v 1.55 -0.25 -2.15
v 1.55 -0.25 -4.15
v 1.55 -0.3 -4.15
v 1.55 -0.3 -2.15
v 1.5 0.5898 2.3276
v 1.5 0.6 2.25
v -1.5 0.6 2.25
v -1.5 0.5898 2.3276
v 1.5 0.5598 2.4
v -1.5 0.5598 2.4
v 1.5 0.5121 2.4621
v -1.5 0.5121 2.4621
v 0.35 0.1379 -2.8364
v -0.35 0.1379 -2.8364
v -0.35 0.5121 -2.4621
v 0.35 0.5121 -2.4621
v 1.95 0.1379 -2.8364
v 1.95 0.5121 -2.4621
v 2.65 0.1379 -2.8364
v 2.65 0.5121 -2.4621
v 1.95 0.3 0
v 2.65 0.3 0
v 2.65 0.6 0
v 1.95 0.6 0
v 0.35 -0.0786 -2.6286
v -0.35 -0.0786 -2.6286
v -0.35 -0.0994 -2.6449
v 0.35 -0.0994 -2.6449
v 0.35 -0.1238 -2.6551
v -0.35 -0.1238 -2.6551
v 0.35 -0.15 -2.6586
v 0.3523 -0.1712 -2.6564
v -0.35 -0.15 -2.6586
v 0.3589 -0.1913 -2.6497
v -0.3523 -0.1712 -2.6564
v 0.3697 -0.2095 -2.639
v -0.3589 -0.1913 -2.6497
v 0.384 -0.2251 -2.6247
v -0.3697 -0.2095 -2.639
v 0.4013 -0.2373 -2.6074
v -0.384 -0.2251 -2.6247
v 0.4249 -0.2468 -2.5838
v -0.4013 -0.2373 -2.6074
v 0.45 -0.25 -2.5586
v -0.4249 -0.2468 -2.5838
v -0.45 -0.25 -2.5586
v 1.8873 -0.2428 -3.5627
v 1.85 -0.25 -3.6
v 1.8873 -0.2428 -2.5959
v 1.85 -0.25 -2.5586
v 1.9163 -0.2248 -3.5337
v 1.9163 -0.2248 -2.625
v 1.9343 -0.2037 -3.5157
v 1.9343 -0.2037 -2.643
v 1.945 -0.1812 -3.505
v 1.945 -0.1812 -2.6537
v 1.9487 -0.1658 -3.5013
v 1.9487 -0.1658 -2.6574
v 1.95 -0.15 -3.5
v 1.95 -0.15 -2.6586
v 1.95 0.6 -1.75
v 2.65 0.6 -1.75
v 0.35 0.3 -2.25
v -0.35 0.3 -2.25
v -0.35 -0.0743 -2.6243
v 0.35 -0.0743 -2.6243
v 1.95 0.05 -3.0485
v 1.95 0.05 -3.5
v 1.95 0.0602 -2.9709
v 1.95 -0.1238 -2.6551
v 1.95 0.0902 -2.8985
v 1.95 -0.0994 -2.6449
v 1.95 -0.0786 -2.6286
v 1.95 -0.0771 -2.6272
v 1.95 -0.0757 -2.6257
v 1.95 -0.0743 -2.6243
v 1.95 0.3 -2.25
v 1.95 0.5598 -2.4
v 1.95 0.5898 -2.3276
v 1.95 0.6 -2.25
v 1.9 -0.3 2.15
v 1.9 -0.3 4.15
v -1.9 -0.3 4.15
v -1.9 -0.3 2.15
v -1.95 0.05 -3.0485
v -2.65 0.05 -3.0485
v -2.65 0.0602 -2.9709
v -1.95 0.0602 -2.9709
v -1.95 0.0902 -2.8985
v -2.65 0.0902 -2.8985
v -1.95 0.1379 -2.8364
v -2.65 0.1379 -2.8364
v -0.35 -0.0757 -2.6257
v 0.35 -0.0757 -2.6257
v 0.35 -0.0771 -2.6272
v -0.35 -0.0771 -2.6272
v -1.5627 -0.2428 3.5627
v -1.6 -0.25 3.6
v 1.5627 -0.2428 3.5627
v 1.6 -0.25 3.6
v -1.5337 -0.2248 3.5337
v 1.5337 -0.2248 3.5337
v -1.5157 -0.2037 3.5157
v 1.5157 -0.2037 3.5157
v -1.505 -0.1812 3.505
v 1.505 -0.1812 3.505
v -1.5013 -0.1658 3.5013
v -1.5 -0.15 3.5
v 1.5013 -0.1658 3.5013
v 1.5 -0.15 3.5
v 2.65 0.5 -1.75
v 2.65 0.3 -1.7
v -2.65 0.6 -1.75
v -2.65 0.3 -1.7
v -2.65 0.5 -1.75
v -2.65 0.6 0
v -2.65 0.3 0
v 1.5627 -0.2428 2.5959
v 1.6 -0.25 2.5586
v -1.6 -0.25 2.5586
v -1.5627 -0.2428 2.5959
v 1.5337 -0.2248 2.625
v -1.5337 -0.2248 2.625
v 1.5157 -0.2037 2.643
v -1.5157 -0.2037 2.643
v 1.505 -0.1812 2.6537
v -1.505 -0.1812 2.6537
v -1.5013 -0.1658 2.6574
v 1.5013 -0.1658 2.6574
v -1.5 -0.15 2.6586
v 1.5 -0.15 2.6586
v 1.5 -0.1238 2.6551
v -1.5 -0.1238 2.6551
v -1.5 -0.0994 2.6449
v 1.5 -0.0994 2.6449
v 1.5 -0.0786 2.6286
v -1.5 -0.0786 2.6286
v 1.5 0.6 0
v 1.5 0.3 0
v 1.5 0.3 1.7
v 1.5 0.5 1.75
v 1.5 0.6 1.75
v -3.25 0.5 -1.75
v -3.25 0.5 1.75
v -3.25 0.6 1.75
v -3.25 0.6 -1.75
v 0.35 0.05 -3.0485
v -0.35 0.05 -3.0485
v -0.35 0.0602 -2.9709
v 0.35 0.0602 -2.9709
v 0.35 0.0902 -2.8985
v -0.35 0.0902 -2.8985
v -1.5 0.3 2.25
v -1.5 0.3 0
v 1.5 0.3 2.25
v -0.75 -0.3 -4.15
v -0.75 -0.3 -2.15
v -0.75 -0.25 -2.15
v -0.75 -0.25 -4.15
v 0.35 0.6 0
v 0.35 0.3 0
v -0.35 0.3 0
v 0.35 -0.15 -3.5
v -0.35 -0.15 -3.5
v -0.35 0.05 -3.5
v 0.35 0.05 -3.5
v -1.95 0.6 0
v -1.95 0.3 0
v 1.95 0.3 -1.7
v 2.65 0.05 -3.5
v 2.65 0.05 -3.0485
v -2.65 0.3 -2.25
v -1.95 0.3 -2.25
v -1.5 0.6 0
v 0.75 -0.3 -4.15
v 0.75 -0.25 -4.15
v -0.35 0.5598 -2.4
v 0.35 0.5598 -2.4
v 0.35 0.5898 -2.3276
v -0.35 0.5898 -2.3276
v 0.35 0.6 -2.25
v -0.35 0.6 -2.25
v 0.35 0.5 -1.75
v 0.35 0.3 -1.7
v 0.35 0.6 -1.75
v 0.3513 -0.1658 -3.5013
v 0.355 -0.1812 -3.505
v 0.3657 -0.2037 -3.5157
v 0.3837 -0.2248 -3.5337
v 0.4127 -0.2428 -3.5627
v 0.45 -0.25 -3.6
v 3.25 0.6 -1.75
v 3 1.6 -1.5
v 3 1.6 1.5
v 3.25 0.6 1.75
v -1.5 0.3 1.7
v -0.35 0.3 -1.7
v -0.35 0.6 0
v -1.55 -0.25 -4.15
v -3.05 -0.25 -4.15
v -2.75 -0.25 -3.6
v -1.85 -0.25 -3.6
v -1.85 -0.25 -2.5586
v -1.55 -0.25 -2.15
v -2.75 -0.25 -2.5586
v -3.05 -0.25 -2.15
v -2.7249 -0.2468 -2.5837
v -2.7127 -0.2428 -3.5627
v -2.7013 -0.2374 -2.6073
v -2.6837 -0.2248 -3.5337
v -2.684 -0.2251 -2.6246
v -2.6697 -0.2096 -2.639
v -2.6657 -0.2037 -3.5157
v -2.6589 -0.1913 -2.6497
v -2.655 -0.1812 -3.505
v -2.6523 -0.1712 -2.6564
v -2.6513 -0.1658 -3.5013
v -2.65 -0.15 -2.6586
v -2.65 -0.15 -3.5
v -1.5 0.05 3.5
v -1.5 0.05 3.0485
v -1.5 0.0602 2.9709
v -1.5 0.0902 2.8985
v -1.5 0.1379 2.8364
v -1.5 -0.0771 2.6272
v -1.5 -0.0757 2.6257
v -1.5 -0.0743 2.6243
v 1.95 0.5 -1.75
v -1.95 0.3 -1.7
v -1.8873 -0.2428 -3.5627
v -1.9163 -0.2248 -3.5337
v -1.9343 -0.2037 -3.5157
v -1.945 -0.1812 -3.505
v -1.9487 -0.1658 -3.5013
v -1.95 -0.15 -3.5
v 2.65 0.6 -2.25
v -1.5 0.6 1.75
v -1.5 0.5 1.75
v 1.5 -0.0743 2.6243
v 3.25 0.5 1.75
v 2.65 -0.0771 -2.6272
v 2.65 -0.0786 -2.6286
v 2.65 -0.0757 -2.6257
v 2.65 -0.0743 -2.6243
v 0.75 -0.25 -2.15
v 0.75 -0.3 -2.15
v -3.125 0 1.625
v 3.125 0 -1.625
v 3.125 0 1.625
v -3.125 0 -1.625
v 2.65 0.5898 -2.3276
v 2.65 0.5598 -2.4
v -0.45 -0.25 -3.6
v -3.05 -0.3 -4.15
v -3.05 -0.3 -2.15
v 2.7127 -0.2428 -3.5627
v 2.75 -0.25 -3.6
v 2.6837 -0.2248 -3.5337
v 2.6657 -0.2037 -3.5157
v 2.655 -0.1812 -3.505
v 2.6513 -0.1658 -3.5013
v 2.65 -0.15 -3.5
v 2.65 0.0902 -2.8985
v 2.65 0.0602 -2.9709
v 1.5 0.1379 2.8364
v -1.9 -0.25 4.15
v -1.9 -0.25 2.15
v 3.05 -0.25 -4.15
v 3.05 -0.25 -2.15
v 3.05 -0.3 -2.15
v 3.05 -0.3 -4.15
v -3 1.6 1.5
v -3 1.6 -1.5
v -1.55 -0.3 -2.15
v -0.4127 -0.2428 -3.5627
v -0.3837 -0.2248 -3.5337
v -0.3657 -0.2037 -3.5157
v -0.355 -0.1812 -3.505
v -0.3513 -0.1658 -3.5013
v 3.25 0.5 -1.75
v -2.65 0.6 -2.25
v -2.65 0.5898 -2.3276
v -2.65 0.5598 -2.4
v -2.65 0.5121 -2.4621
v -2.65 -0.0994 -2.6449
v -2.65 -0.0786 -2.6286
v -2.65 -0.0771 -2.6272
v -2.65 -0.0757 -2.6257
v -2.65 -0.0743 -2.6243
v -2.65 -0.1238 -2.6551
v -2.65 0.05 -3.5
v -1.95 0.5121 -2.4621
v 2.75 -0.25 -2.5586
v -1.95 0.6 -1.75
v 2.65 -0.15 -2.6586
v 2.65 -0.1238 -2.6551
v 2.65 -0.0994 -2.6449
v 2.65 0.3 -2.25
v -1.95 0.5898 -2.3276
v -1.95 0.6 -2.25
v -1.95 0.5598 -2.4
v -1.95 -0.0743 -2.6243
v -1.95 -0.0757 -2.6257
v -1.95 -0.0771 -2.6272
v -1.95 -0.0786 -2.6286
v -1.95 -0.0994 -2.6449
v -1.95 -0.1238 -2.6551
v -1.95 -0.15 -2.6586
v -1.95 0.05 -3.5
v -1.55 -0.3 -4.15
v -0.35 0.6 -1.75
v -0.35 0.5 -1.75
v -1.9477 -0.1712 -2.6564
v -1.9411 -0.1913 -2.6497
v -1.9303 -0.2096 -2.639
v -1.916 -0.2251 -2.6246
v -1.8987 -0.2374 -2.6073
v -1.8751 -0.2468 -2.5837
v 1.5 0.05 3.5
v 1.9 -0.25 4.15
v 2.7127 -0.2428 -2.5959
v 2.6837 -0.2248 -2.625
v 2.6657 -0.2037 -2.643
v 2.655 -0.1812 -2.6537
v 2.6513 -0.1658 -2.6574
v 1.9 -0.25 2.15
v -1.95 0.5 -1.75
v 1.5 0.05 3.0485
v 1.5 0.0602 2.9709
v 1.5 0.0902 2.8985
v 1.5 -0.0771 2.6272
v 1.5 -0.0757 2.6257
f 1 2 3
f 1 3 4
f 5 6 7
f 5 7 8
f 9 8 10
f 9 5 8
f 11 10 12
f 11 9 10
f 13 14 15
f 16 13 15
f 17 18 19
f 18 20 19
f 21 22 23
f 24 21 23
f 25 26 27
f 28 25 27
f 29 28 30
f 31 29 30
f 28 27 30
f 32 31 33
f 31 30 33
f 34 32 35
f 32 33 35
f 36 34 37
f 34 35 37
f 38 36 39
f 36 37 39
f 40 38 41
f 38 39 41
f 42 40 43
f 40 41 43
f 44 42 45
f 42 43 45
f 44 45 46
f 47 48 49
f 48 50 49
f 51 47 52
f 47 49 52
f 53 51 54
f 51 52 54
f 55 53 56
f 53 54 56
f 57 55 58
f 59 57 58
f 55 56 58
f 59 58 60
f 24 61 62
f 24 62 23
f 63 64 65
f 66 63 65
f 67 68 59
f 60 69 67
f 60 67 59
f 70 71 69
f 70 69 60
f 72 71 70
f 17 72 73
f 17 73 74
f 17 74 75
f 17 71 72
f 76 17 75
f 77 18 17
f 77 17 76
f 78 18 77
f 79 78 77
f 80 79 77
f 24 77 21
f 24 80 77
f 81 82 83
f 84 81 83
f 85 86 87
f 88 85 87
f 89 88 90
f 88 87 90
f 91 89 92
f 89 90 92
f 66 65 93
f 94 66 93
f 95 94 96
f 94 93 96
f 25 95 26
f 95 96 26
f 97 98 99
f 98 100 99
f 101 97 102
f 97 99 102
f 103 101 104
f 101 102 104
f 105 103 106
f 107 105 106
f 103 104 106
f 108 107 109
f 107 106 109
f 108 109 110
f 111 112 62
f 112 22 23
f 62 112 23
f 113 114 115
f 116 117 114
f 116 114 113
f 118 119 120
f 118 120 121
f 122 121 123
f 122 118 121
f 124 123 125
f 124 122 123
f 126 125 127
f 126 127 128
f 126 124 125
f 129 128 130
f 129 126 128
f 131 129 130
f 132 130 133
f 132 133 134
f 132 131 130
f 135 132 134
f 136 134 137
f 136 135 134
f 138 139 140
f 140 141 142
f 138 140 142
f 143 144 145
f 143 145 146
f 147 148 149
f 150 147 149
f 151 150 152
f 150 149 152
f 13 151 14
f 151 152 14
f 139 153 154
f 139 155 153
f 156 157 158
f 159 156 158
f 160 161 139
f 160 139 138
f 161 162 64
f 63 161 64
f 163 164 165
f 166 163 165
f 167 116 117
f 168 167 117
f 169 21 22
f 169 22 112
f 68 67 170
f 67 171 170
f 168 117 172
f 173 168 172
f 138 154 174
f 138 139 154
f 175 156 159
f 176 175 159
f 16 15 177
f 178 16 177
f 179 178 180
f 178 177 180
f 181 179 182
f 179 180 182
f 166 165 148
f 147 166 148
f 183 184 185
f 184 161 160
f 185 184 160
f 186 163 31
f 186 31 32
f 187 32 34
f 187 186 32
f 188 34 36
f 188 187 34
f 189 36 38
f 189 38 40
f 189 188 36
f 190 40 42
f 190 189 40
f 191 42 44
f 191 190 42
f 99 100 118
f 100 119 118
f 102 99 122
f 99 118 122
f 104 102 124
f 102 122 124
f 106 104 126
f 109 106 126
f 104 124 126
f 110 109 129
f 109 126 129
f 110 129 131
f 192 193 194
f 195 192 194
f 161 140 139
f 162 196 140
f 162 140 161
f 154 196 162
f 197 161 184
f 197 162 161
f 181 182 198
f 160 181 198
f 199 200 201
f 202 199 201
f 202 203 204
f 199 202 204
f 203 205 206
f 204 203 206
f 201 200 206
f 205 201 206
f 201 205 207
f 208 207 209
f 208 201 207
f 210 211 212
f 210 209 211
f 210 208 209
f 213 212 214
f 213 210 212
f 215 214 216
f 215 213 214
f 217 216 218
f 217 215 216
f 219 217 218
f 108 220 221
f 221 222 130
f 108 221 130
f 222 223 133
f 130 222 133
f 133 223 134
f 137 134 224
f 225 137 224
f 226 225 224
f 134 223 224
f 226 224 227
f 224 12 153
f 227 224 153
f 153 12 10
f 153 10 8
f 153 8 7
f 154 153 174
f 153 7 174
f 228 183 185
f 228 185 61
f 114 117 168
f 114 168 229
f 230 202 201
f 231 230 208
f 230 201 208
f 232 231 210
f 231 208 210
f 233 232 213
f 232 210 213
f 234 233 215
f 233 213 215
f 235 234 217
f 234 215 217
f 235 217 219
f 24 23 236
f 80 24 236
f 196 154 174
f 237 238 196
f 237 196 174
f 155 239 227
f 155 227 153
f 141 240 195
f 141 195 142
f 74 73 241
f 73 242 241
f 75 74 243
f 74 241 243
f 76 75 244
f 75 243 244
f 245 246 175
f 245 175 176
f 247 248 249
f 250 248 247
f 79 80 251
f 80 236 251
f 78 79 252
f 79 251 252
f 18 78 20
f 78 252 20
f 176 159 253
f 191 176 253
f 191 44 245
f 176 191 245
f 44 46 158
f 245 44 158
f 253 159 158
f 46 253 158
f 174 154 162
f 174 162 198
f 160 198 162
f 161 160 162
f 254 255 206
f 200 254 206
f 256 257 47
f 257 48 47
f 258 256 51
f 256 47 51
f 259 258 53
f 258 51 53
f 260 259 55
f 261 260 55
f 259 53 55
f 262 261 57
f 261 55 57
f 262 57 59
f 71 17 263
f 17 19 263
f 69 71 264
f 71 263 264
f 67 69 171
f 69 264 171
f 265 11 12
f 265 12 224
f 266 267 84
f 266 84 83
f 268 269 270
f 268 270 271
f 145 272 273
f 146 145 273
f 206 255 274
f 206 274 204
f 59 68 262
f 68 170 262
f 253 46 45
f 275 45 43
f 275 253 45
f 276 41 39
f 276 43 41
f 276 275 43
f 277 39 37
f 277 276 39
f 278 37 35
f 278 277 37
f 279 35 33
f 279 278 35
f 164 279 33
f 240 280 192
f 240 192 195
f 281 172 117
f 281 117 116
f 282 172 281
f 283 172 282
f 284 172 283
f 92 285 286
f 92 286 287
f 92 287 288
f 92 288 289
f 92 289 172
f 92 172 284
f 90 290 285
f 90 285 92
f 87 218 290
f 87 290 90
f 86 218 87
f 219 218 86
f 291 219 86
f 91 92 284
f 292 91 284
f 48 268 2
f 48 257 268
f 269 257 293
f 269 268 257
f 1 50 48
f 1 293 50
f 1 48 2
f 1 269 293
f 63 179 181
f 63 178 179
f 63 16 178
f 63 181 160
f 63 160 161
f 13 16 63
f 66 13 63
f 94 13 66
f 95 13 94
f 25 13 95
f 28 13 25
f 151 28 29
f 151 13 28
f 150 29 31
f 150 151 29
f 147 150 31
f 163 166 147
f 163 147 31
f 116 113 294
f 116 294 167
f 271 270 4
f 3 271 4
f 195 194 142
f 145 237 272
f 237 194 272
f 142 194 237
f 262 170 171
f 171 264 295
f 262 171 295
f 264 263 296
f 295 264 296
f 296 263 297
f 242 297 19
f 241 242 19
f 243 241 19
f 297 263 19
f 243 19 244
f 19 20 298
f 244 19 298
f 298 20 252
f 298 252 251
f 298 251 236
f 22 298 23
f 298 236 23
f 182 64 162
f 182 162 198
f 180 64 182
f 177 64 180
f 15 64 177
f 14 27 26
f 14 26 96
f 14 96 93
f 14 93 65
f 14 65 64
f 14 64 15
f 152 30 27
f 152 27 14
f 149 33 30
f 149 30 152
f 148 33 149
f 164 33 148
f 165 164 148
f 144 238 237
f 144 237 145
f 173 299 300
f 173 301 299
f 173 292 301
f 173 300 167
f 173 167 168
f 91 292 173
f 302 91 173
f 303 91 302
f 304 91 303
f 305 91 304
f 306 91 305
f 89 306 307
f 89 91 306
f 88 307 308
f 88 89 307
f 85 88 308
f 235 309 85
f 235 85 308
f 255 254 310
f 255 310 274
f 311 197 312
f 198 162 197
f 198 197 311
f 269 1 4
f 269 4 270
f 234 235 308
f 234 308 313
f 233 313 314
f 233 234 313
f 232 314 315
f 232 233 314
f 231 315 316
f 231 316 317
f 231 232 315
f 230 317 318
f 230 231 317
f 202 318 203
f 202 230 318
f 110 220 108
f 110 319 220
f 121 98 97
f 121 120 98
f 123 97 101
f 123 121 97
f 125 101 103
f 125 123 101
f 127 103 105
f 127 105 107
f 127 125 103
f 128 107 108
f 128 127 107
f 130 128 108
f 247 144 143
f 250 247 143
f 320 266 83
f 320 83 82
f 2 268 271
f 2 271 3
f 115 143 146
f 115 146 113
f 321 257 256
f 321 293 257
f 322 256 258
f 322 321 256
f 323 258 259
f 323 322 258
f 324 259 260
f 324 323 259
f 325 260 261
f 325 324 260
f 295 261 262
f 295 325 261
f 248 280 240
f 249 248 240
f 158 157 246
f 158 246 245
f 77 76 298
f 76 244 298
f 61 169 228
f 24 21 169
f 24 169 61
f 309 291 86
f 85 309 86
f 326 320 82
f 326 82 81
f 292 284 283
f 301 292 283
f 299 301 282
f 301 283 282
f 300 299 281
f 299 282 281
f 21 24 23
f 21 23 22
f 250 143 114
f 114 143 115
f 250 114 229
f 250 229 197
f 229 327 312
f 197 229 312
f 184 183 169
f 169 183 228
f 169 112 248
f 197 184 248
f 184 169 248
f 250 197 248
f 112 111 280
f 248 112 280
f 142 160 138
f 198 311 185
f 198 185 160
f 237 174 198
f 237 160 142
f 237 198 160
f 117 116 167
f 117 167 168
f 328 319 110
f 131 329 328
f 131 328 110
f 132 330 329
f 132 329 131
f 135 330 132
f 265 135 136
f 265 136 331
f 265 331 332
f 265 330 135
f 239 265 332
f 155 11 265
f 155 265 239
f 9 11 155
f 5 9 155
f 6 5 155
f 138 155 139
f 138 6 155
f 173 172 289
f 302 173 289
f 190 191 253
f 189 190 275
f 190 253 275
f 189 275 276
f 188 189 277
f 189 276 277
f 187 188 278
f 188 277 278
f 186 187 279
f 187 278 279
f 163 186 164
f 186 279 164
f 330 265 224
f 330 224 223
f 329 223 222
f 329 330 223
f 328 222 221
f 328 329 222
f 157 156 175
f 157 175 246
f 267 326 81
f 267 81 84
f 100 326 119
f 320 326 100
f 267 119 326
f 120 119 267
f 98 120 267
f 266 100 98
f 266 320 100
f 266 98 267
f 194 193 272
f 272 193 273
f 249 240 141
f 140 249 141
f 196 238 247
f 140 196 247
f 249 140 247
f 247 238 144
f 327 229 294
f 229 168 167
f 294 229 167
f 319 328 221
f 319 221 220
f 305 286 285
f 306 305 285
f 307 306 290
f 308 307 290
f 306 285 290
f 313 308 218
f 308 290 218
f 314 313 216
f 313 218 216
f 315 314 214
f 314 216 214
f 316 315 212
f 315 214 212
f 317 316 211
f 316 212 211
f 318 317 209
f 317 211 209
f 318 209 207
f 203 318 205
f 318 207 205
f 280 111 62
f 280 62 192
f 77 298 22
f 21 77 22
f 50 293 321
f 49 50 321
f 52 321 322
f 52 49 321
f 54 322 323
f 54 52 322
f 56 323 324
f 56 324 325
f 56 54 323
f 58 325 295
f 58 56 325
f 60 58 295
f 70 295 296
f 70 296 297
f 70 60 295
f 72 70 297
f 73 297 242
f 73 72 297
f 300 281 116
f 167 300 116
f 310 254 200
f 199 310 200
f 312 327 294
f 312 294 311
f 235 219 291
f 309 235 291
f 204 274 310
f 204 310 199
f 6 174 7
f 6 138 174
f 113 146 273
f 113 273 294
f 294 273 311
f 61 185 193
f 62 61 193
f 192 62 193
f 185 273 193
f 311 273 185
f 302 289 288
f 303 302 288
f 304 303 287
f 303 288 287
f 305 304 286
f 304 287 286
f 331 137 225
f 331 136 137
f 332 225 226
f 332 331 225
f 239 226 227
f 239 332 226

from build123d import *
from OCP.BRepFilletAPI import BRepFilletAPI_MakeChamfer

# Parameters (mm, degrees)
BOSS_EXTRUDE1_DEPTH   = 1.6
CHAMFER1_SIZE         = 1
CHAMFER1_SIZE2        = 0.25
CHAMFER2_SIZE         = 0.125
CHAMFER2_SIZE2        = 0.5
EXTRUDE_THIN1_DEPTH   = 1.5
EXTRUDE_THIN2_DEPTH   = 0.35
BOSS_EXTRUDE2_DEPTH   = 0.05
FILLET1_R             = 0.1
FILLET2_R             = 0.1
LPATTERN1_START       = -2.75
LPATTERN1_DEPTH       = 0.9
LPATTERN1_START_2     = -3.05
LPATTERN1_2_OUTLINE_W = 0.04999999999999999
LPATTERN1_2_OUTLINE_H = 2.0000000000000004
LPATTERN1_2_DEPTH     = 1.5
LPATTERN1_START_3     = -5
LPATTERN1_3_DEPTH     = 5
LPATTERN1_START_4     = -0.45
LPATTERN1_4_DEPTH     = 0.9
LPATTERN1_START_5     = -0.75
LPATTERN1_5_OUTLINE_W = 0.04999999999999999
LPATTERN1_5_OUTLINE_H = 2.0000000000000004
LPATTERN1_5_DEPTH     = 1.5
LPATTERN1_6_DEPTH     = 5
INDENT1_START         = -1.5
INDENT1_DEPTH         = 3
INDENT1_START_2       = -2.65
INDENT1_2_DEPTH       = 0.7
INDENT1_START_3       = -0.35
INDENT1_3_DEPTH       = 0.7
INDENT1_START_4       = 1.95
INDENT1_4_DEPTH       = 0.7


with BuildPart() as part:
    # Sketch1 → Boss-Extrude1 (new body)
    with BuildSketch(Plane(origin=(0, 0, 0), x_dir=(1, 0, 0), z_dir=(0, 1, 0))):
        Polygon((-3.2500000000000004, 1.7500000000000002), (3.2499999999999996, 1.7500000000000002), (3.25, -1.75), (-3.2500000000000004, -1.749999999999998), align=None)
    extrude(amount=BOSS_EXTRUDE1_DEPTH)

    # Chamfer1: one chamfer whose edges measure the first distance from different faces: ONE call of the kernel's chamfer builder (chamfer() names one face for all edges)
    chamfer1_edges_1 = [part.edges().sort_by_distance(p)[0] for p in [
        (-3.2500000000000004, 1.6, -1.11e-15),
    ]]
    chamfer1_side_1 = [part.faces().sort_by_distance(p)[0] for p in [
        (-3.2500000000000004, 0.8, -1.17e-15),
    ]]
    chamfer1_edges_2 = [part.edges().sort_by_distance(p)[0] for p in [
        (0, 1.6, 1.7499999999999991),
    ]]
    chamfer1_side_2 = [part.faces().sort_by_distance(p)[0] for p in [
        (-6e-17, 0.8, 1.7499999999999991),
    ]]
    chamfer1_edges_3 = [part.edges().sort_by_distance(p)[0] for p in [
        (3.25, 1.6, -2.2e-16),
    ]]
    chamfer1_side_3 = [part.faces().sort_by_distance(p)[0] for p in [
        (3.25, 0.8, -1.6e-16),
    ]]
    chamfer1_edges_4 = [part.edges().sort_by_distance(p)[0] for p in [
        (-4.4e-16, 1.6, -1.7500000000000002),
    ]]
    chamfer1_side_4 = [part.faces().sort_by_distance(p)[0] for p in [
        (-4.3e-16, 0.8, -1.7500000000000002),
    ]]
    chamfer1 = BRepFilletAPI_MakeChamfer(part.part.solid().wrapped)
    for e in chamfer1_edges_1:
        chamfer1.Add(CHAMFER1_SIZE, CHAMFER1_SIZE2, e.wrapped, chamfer1_side_1[0].wrapped)  # the first distance lies on this face
    for e in chamfer1_edges_2:
        chamfer1.Add(CHAMFER1_SIZE, CHAMFER1_SIZE2, e.wrapped, chamfer1_side_2[0].wrapped)  # the first distance lies on this face
    for e in chamfer1_edges_3:
        chamfer1.Add(CHAMFER1_SIZE, CHAMFER1_SIZE2, e.wrapped, chamfer1_side_3[0].wrapped)  # the first distance lies on this face
    for e in chamfer1_edges_4:
        chamfer1.Add(CHAMFER1_SIZE, CHAMFER1_SIZE2, e.wrapped, chamfer1_side_4[0].wrapped)  # the first distance lies on this face
    add(Compound.cast(chamfer1.Shape()), mode=Mode.REPLACE)

    # Chamfer2
    chamfer2_edges = [part.edges().sort_by_distance(p)[0] for p in [
        (0, 0, 1.7499999999999991),
        (-3.2500000000000004, 0, -1.11e-15),
        (-4.4e-16, 0, -1.7500000000000002),
        (3.25, 0, -2.2e-16),
    ]]
    chamfer2_side = [part.faces().sort_by_distance(p)[0] for p in [
        (4e-17, 0, -5.8e-16),
    ]]
    chamfer(chamfer2_edges, length=CHAMFER2_SIZE, length2=CHAMFER2_SIZE2, reference=chamfer2_side[0])

    # Indent1: read off the stored shape, not the designer's step
    # Indent1 outline → Indent1 (cut)
    with BuildSketch(Plane.YZ.offset(INDENT1_START)):
        Polygon((0.3, 0), (0.6, 0), (0.6, 1.75), (0.5, 1.75), (0.3, 1.7), align=None)
    extrude(amount=INDENT1_DEPTH, mode=Mode.SUBTRACT)

    # Indent1 2 outline → Indent1 2 (cut)
    with BuildSketch(Plane.YZ.offset(INDENT1_START_2)):
        Polygon((0.5, -1.75), (0.6, -1.75), (0.6, 0), (0.3, 0), (0.3, -1.7), align=None)
    extrude(amount=INDENT1_2_DEPTH, mode=Mode.SUBTRACT)

    # Indent1 3 outline → Indent1 3 (cut)
    with BuildSketch(Plane.YZ.offset(INDENT1_START_3)):
        Polygon((0.5, -1.75), (0.6, -1.75), (0.6, 0), (0.3, 0), (0.3, -1.7), align=None)
    extrude(amount=INDENT1_3_DEPTH, mode=Mode.SUBTRACT)

    # Indent1 4 outline → Indent1 4 (cut)
    with BuildSketch(Plane.YZ.offset(INDENT1_START_4)):
        Polygon((0.5, -1.75), (0.6, -1.75), (0.6, 0), (0.3, 0), (0.3, -1.7), align=None)
    extrude(amount=INDENT1_4_DEPTH, mode=Mode.SUBTRACT)


with BuildPart() as body_2:
    # Sketch2 → Extrude-Thin1 (new, symmetric)
    with BuildSketch(Plane(origin=(0, 0, 0), x_dir=(0, 0, -1), z_dir=(1, 0, 0))):
        with BuildLine():
            Line((0, 0.6), (-2.25, 0.5999999999999998))
            ThreePointArc((-2.25, 0.5999999999999998), (-2.3648050297095278, 0.577163859753389), (-2.4621320343559647, 0.5121320343559638))
            Line((-2.4621320343559647, 0.5121320343559638), (-2.836396103067891, 0.13786796564403583))
            ThreePointArc((-2.836396103067891, 0.13786796564403583), (-2.9337231077143313, 0.07283614024661894), (-3.048528137423855, 0.04999999999999964))
            Line((-3.048528137423855, 0.04999999999999964), (-3.5, 0.04999999999999957))
            Line((-3.5, 0.04999999999999957), (-3.5, -0.25000000000000044))
            Line((-3.5, -0.25000000000000044), (-3.048528137423855, -0.25000000000000033))
            ThreePointArc((-3.048528137423839, -0.2500000000000004), (-2.8189180780047915, -0.20432771950676182), (-2.6242640687119105, -0.07426406871192798))
            Line((-2.624264068711926, -0.07426406871192787), (-2.25, 0.30000000000000004))
            Line((-2.25, 0.29999999999999977), (3e-17, 0.3))
            Line((3e-17, 0.3), (0, 0.6))
        make_face()
    extrude(amount=EXTRUDE_THIN1_DEPTH, both=True)



with BuildPart() as body_3:
    # Sketch3 → Extrude-Thin2 (new, symmetric)
    with BuildSketch(Plane(origin=(2.3, 0, 0), x_dir=(0, 0, -1), z_dir=(1, 0, 0))):
        with BuildLine():
            Line((0, 0.6), (2.25, 0.5999999999999998))
            ThreePointArc((2.25, 0.5999999999999998), (2.364805029709526, 0.5771638597533844), (2.4621320343559647, 0.5121320343559636))
            Line((2.4621320343559647, 0.5121320343559636), (2.836396103067891, 0.13786796564403606))
            ThreePointArc((2.836396103067891, 0.13786796564403606), (2.933723107714331, 0.0728361402466185), (3.048528137423855, 0.05000000000000013))
            Line((3.048528137423855, 0.05000000000000013), (3.5, 0.05000000000000001))
            Line((3.5, 0.05000000000000001), (3.5, -0.24999999999999997))
            Line((3.5, -0.24999999999999997), (3.048528137423855, -0.24999999999999986))
            ThreePointArc((3.0485281374238418, -0.24999999999999994), (2.8189180780047933, -0.20432771950676315), (2.6242640687119128, -0.07426406871192781))
            Line((2.624264068711926, -0.07426406871192778), (2.25, 0.2999999999999997))
            Line((2.25, 0.29999999999999977), (-3e-17, 0.3))
            Line((-3e-17, 0.3), (0, 0.6))
        make_face()
    extrude(amount=EXTRUDE_THIN2_DEPTH, both=True)


with BuildPart() as body_2_1:
    add(body_2.part)

    add(body_3.part)  # Boss-Extrude2 merges body 3
    # Sketch4 → Boss-Extrude2 (add)
    with BuildSketch(Plane.XZ.offset(0.24999999999999903)):
        Polygon((1.5499999999999998, -2.1499999999999995), (3.05, -2.1499999999999995), (3.05, -4.1499999999999995), (1.55, -4.1499999999999995), align=None)
        Polygon((-1.8999999999999984, 4.1499999999999995), (1.9000000000000012, 4.15), (1.9000000000000017, 2.149999999999999), (-1.8999999999999984, 2.149999999999999), align=None)
    extrude(amount=BOSS_EXTRUDE2_DEPTH)

    # Fillet1
    fillet1_edges = [body_2_1.edges().sort_by_distance(p)[0] for p in [
        (1.9499999999999997, -0.24999999999999992, -3.2742640687119273),
        (2.3, -0.2499999999999999, -3.0485281374238484),
        (2.3, -0.24999999999999997, -3.5),
        (2.65, -0.24999999999999992, -3.2742640687119273),
    ]]
    fillet(fillet1_edges, radius=FILLET1_R)

    # Fillet2
    fillet2_edges = [body_2_1.edges().sort_by_distance(p)[0] for p in [
        (1.5, -0.2500000000000004, 3.2742640687119273),
        (-1.5, -0.2500000000000004, 3.2742640687119273),
        (0, -0.25000000000000033, 3.048528137423847),
        (0, -0.25000000000000044, 3.5),
    ]]
    fillet(fillet2_edges, radius=FILLET2_R)


with BuildPart() as body_3_2:
    # LPattern1: read off the stored shape, not the designer's step
    # LPattern1 outline → LPattern1 (new body)
    with BuildSketch(Plane.YZ.offset(LPATTERN1_START)):
        with BuildLine():
            ThreePointArc((-0.25, -3.6), (-0.220710678, -3.529289322), (-0.15, -3.5))
            Line((-0.15, -3.5), (0.05, -3.5))
            Line((0.05, -3.5), (0.05, -3.048528137))
            ThreePointArc((0.05, -3.048528137), (0.07283614, -2.933723107), (0.137867966, -2.836396103))
            Line((0.137867966, -2.836396103), (0.512132034, -2.462132034))
            ThreePointArc((0.512132034, -2.462132034), (0.57716386, -2.36480503), (0.6, -2.25))
            Line((0.6, -2.25), (0.6, 0))
            Line((0.6, 0), (0.3, 0))
            Line((0.3, 0), (0.3, -2.25))
            Line((0.3, -2.25), (-0.074264069, -2.624264069))
            ThreePointArc((-0.074264069, -2.624264069), (-0.076423299, -2.626434345), (-0.078571429, -2.62861561))
            ThreePointArc((-0.078571429, -2.62861561), (-0.187796447, -2.651212199), (-0.25, -2.558630189))
            Line((-0.25, -2.558630189), (-0.25, -2.15))
            Line((-0.25, -2.15), (-0.3, -2.15))
            Line((-0.3, -2.15), (-0.3, -4.15))
            Line((-0.3, -4.15), (-0.25, -4.15))
            Line((-0.25, -4.15), (-0.25, -3.6))
        make_face()
    extrude(amount=LPATTERN1_DEPTH)

    # LPattern1 2 outline → LPattern1 2 (add)
    with BuildSketch(Plane.YZ.offset(LPATTERN1_START_2)):
        with Locations((-0.275, -3.1500000000000004)):
            Rectangle(LPATTERN1_2_OUTLINE_W, LPATTERN1_2_OUTLINE_H)
    extrude(amount=LPATTERN1_2_DEPTH)

    # LPattern1 3 outline → LPattern1 3 (cut)
    with BuildSketch(Plane.XY.offset(LPATTERN1_START_3)):
        with BuildLine():
            ThreePointArc((-1.95, -0.15), (-1.920710678, -0.220710678), (-1.85, -0.25))
            Line((-1.85, -0.25), (-1.85, 0.6))
            Line((-1.85, 0.6), (-1.95, 0.6))
            Line((-1.95, 0.6), (-1.95, -0.15))
        make_face()
        with BuildLine():
            ThreePointArc((-2.75, -0.25), (-2.679289322, -0.220710678), (-2.65, -0.15))
            Line((-2.65, -0.15), (-2.65, 0.6))
            Line((-2.65, 0.6), (-2.75, 0.6))
            Line((-2.75, 0.6), (-2.75, -0.25))
        make_face()
    extrude(amount=LPATTERN1_3_DEPTH, mode=Mode.SUBTRACT)


with BuildPart() as body_4:
    # LPattern1 4 outline → LPattern1 4 (new body)
    with BuildSketch(Plane.YZ.offset(LPATTERN1_START_4)):
        with BuildLine():
            ThreePointArc((-0.25, -3.6), (-0.220710678, -3.529289322), (-0.15, -3.5))
            Line((-0.15, -3.5), (0.05, -3.5))
            Line((0.05, -3.5), (0.05, -3.048528137))
            ThreePointArc((0.05, -3.048528137), (0.07283614, -2.933723107), (0.137867966, -2.836396103))
            Line((0.137867966, -2.836396103), (0.512132034, -2.462132034))
            ThreePointArc((0.512132034, -2.462132034), (0.57716386, -2.36480503), (0.6, -2.25))
            Line((0.6, -2.25), (0.6, 0))
            Line((0.6, 0), (0.3, 0))
            Line((0.3, 0), (0.3, -2.25))
            Line((0.3, -2.25), (-0.074264069, -2.624264069))
            ThreePointArc((-0.074264069, -2.624264069), (-0.076423299, -2.626434345), (-0.078571429, -2.62861561))
            ThreePointArc((-0.078571429, -2.62861561), (-0.187796447, -2.651212199), (-0.25, -2.558630189))
            Line((-0.25, -2.558630189), (-0.25, -2.15))
            Line((-0.25, -2.15), (-0.3, -2.15))
            Line((-0.3, -2.15), (-0.3, -4.15))
            Line((-0.3, -4.15), (-0.25, -4.15))
            Line((-0.25, -4.15), (-0.25, -3.6))
        make_face()
    extrude(amount=LPATTERN1_4_DEPTH)

    # LPattern1 5 outline → LPattern1 5 (add)
    with BuildSketch(Plane.YZ.offset(LPATTERN1_START_5)):
        with Locations((-0.275, -3.1500000000000004)):
            Rectangle(LPATTERN1_5_OUTLINE_W, LPATTERN1_5_OUTLINE_H)
    extrude(amount=LPATTERN1_5_DEPTH)

    # LPattern1 6 outline → LPattern1 6 (cut)
    with BuildSketch(Plane.XY.offset(LPATTERN1_START_3)):
        with BuildLine():
            ThreePointArc((0.35, -0.15), (0.379289322, -0.220710678), (0.45, -0.25))
            Line((0.45, -0.25), (0.45, 0.6))
            Line((0.45, 0.6), (0.35, 0.6))
            Line((0.35, 0.6), (0.35, -0.15))
        make_face()
        with BuildLine():
            ThreePointArc((-0.45, -0.25), (-0.379289322, -0.220710678), (-0.35, -0.15))
            Line((-0.35, -0.15), (-0.35, 0.6))
            Line((-0.35, 0.6), (-0.45, 0.6))
            Line((-0.45, 0.6), (-0.45, -0.25))
        make_face()
    extrude(amount=LPATTERN1_6_DEPTH, mode=Mode.SUBTRACT)


solid = Compound([part.part, body_2_1.part, body_3_2.part, body_4.part])
